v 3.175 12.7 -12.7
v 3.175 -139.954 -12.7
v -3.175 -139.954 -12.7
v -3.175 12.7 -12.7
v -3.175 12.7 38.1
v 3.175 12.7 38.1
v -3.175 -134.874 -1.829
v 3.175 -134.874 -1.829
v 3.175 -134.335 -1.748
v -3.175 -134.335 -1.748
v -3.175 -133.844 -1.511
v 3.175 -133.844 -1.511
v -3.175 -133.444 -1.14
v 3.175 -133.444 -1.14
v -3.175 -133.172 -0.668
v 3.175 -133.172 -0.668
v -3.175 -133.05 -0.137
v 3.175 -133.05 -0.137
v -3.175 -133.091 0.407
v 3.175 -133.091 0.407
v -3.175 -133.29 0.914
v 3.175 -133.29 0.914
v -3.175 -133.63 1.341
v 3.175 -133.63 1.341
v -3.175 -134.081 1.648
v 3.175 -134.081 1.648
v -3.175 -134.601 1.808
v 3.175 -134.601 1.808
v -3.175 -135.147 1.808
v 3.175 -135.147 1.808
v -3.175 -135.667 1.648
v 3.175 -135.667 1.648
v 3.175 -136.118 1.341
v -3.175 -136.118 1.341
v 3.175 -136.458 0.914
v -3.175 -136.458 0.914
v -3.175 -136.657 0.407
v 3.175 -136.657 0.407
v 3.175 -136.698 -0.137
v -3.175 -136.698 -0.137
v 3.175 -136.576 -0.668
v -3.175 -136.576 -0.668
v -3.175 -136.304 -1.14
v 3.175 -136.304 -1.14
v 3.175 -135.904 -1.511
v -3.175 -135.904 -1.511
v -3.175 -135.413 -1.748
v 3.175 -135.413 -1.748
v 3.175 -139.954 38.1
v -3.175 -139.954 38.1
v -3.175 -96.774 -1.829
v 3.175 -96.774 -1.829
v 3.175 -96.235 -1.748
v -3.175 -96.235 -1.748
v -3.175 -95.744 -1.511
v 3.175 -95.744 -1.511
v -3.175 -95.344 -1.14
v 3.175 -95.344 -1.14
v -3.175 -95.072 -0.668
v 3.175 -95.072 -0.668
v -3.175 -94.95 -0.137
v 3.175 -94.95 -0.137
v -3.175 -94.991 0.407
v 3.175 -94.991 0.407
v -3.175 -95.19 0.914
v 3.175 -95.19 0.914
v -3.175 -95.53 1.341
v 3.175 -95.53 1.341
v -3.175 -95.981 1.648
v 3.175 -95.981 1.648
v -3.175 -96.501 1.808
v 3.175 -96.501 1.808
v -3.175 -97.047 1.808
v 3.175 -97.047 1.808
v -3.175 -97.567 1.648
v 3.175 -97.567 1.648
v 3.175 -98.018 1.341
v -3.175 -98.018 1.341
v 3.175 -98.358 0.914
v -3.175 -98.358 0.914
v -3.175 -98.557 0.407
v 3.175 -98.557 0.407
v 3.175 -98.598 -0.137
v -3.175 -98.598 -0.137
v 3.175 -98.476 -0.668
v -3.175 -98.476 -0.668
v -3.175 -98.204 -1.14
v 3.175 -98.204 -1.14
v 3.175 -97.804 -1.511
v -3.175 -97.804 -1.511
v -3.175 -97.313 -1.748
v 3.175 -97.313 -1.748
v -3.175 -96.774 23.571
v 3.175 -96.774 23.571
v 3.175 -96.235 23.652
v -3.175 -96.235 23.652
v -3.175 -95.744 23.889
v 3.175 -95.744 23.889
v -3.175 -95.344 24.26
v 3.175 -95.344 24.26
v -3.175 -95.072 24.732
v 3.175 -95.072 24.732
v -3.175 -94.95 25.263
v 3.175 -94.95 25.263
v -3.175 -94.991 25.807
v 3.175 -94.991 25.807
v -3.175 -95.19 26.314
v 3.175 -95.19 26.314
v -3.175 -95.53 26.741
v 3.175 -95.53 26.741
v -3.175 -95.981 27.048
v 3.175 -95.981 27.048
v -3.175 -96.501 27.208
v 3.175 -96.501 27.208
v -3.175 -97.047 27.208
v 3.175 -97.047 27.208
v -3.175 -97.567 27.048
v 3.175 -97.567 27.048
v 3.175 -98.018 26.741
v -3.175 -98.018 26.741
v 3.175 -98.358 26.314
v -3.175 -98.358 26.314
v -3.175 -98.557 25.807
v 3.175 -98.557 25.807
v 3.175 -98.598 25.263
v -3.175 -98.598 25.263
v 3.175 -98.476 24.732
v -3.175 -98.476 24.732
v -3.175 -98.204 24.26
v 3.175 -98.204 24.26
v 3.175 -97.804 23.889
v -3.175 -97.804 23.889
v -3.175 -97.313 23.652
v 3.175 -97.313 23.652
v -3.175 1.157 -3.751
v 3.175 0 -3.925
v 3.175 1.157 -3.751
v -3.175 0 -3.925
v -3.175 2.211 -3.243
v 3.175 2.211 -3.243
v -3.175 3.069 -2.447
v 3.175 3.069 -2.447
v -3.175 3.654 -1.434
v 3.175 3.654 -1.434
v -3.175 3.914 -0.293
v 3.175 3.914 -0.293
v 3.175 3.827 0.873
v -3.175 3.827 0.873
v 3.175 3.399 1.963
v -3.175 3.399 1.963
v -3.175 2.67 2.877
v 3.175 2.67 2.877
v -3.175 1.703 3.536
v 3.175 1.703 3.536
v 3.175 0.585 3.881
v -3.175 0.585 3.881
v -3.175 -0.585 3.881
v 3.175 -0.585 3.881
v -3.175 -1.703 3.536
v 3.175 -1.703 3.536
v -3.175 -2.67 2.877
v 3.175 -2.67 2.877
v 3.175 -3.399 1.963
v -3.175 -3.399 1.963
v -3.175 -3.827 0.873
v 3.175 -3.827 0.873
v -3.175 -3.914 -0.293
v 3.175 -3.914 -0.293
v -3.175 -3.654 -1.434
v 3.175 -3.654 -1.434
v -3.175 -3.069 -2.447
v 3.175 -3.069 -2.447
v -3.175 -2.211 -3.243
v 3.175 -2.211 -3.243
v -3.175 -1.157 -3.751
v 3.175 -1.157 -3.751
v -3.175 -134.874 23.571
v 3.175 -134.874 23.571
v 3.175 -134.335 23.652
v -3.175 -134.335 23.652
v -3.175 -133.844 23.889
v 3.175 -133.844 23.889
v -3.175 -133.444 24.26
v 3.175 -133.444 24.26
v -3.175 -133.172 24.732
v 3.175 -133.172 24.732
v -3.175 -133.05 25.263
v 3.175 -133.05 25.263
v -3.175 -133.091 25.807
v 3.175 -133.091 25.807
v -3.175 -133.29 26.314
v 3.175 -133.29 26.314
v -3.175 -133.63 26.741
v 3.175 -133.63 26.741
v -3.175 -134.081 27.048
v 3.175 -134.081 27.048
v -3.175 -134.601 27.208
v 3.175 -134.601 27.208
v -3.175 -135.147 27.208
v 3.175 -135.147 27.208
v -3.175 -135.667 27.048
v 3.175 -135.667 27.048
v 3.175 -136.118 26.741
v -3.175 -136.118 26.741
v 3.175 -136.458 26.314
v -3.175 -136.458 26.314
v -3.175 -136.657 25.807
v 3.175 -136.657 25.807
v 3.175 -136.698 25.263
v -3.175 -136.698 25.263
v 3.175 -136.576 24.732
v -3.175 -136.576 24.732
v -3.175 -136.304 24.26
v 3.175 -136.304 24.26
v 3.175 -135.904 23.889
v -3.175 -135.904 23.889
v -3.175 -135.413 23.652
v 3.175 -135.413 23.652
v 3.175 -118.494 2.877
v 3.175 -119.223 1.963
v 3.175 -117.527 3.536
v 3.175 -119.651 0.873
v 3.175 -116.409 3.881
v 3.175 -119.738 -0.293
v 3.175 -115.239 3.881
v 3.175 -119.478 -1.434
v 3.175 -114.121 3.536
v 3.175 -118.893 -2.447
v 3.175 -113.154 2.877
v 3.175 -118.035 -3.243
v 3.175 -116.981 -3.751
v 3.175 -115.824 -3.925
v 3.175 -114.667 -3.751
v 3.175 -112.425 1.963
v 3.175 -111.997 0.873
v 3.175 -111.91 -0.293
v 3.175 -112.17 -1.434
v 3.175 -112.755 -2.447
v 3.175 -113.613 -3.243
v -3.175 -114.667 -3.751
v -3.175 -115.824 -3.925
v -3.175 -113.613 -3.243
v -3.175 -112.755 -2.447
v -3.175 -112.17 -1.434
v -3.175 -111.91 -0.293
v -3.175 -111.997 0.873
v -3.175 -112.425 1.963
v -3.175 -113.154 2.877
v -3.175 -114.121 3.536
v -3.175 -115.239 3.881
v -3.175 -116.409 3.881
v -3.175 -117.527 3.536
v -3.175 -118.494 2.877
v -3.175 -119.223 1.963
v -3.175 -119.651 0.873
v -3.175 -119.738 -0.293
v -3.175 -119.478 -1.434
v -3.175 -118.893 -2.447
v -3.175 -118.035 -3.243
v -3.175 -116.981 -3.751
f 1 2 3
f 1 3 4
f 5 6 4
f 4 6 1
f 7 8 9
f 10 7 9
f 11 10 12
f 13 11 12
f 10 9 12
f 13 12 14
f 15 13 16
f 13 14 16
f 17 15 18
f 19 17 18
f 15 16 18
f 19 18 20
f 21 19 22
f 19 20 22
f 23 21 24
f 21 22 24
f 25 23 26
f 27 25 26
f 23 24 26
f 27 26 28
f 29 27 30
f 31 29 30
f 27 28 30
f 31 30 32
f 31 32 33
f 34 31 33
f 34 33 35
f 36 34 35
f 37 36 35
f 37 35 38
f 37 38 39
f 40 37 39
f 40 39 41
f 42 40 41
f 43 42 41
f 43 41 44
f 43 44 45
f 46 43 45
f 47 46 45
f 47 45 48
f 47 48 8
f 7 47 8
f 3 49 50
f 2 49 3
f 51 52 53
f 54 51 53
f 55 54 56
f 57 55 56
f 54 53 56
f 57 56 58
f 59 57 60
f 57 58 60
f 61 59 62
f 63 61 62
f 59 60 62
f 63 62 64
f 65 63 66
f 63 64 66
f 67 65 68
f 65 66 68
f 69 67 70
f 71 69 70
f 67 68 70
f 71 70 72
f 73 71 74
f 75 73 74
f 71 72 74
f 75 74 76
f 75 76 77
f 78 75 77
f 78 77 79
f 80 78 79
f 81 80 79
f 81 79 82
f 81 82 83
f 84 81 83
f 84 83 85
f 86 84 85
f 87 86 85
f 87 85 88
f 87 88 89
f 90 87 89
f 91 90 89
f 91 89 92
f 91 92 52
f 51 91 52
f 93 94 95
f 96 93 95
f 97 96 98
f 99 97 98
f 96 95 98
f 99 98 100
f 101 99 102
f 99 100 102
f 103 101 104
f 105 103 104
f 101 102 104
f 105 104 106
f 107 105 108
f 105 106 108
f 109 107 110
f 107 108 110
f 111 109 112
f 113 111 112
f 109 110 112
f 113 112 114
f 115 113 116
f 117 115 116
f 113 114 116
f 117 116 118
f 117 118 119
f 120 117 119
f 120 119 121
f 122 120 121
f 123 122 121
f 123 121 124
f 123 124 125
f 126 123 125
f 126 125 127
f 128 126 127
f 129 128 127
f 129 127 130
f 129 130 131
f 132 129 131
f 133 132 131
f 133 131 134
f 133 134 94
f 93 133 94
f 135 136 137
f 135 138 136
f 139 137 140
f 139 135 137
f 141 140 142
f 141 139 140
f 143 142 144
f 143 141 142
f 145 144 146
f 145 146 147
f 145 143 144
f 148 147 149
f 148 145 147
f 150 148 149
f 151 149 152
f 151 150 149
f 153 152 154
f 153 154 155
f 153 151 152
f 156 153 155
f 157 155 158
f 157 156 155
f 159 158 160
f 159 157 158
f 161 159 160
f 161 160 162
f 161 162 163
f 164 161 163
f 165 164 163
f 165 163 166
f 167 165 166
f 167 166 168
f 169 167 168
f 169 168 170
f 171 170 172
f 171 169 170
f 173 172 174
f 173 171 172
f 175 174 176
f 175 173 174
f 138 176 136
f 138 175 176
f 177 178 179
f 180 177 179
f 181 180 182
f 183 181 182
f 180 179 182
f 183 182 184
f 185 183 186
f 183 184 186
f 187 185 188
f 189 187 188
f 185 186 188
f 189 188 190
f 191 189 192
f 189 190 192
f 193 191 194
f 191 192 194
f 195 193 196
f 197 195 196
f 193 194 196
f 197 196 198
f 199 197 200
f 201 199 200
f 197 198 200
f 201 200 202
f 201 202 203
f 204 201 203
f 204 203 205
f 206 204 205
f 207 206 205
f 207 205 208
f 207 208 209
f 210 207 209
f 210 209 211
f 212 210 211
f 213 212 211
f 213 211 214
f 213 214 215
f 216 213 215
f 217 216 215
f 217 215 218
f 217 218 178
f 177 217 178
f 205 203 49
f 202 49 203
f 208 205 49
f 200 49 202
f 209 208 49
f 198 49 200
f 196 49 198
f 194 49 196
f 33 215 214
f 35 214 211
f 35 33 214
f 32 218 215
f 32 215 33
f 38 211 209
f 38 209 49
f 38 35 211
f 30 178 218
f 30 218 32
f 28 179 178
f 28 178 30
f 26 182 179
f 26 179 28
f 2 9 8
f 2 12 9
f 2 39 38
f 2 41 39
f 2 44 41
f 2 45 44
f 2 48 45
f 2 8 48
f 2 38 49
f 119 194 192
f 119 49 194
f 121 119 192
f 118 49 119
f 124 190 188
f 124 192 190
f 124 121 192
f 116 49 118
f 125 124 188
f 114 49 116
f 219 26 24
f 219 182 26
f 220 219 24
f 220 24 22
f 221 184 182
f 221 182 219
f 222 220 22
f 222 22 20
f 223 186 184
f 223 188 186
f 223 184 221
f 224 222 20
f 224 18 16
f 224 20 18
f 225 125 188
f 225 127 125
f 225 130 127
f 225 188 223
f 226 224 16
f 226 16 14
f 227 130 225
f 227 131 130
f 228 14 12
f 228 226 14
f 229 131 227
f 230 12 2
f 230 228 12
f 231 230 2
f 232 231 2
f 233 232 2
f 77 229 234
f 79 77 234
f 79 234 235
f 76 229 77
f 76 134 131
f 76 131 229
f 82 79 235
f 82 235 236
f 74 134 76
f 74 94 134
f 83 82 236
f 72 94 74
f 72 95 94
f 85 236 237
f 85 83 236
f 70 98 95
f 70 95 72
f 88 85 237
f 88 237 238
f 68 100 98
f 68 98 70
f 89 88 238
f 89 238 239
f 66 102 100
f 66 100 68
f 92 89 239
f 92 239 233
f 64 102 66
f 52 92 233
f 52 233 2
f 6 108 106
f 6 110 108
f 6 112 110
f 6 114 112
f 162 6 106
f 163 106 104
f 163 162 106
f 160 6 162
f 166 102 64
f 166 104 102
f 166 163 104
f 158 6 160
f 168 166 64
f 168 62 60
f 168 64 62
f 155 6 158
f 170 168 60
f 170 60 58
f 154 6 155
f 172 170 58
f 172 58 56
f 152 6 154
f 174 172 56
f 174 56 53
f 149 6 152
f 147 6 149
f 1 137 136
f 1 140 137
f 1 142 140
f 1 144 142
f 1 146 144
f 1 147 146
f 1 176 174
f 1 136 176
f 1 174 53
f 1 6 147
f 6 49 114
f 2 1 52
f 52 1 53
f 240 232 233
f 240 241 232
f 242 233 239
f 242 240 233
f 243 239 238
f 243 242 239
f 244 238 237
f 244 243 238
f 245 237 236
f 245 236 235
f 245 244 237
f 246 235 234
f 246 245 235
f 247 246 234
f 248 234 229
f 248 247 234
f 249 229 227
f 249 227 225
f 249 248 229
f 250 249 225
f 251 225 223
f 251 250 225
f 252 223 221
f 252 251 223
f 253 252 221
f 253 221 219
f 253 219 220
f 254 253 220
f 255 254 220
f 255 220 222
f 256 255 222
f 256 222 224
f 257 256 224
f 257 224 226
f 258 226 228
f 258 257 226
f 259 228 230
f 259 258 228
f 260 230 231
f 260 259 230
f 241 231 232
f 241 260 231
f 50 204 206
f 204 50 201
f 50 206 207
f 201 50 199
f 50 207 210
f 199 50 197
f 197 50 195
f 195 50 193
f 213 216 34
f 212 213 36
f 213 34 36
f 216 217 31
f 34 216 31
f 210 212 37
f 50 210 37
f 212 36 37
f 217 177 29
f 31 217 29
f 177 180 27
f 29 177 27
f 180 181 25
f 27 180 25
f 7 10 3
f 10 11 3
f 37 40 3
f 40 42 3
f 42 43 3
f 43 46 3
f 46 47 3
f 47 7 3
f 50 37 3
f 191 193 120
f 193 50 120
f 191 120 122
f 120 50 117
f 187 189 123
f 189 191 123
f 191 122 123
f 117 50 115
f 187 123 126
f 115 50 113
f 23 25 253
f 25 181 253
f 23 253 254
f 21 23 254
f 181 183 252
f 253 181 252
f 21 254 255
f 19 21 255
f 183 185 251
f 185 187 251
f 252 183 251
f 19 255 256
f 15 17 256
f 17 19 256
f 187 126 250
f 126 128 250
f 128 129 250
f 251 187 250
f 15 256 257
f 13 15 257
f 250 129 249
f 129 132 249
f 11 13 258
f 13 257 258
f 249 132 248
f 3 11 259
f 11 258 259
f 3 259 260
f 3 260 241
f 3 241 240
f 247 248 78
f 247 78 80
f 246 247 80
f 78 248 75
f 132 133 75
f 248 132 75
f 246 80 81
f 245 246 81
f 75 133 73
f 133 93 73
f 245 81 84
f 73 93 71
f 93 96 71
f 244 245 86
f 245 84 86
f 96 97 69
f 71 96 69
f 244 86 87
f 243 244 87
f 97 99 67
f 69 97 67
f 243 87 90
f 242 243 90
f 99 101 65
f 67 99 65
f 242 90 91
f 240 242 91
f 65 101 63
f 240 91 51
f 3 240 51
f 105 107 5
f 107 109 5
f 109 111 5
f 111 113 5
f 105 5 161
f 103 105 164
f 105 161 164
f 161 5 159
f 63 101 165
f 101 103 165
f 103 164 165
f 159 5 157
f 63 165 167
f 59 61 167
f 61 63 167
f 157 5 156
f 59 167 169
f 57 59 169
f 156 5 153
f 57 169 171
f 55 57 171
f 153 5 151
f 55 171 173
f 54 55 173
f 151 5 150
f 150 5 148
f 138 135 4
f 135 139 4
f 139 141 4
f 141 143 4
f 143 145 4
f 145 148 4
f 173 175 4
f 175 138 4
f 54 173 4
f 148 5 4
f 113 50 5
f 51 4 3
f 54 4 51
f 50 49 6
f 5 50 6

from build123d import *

# Parameters (mm, degrees)
SKETCH1_W             = 50.8
SKETCH1_H             = 152.654
SKETCH1_R             = 3.925
BOSS_EXTRUDE1_DEPTH   = 3.175
F_6_CLEARANCE_HOLE1_D = 3.6576


with BuildPart() as part:
    # Sketch1 → Boss-Extrude1 (new, symmetric)
    with BuildSketch(Plane(origin=(0, 0, 0), x_dir=(0, 0, -1), z_dir=(1, 0, 0))):
        with Locations((-12.7, -63.627)):
            Rectangle(SKETCH1_W, SKETCH1_H)
        Circle(SKETCH1_R, mode=Mode.SUBTRACT)
        with Locations((0, -115.824)):
            Circle(SKETCH1_R, mode=Mode.SUBTRACT)
    extrude(amount=BOSS_EXTRUDE1_DEPTH, both=True)

    # #6 Clearance Hole1 (through all)
    with Locations(Plane.ZY.offset(3.175)):
        with Locations((0, -96.774), (25.4, -96.774), (25.4, -134.874), (0, -134.874)):
            Hole(F_6_CLEARANCE_HOLE1_D / 2)


solid = part.part
